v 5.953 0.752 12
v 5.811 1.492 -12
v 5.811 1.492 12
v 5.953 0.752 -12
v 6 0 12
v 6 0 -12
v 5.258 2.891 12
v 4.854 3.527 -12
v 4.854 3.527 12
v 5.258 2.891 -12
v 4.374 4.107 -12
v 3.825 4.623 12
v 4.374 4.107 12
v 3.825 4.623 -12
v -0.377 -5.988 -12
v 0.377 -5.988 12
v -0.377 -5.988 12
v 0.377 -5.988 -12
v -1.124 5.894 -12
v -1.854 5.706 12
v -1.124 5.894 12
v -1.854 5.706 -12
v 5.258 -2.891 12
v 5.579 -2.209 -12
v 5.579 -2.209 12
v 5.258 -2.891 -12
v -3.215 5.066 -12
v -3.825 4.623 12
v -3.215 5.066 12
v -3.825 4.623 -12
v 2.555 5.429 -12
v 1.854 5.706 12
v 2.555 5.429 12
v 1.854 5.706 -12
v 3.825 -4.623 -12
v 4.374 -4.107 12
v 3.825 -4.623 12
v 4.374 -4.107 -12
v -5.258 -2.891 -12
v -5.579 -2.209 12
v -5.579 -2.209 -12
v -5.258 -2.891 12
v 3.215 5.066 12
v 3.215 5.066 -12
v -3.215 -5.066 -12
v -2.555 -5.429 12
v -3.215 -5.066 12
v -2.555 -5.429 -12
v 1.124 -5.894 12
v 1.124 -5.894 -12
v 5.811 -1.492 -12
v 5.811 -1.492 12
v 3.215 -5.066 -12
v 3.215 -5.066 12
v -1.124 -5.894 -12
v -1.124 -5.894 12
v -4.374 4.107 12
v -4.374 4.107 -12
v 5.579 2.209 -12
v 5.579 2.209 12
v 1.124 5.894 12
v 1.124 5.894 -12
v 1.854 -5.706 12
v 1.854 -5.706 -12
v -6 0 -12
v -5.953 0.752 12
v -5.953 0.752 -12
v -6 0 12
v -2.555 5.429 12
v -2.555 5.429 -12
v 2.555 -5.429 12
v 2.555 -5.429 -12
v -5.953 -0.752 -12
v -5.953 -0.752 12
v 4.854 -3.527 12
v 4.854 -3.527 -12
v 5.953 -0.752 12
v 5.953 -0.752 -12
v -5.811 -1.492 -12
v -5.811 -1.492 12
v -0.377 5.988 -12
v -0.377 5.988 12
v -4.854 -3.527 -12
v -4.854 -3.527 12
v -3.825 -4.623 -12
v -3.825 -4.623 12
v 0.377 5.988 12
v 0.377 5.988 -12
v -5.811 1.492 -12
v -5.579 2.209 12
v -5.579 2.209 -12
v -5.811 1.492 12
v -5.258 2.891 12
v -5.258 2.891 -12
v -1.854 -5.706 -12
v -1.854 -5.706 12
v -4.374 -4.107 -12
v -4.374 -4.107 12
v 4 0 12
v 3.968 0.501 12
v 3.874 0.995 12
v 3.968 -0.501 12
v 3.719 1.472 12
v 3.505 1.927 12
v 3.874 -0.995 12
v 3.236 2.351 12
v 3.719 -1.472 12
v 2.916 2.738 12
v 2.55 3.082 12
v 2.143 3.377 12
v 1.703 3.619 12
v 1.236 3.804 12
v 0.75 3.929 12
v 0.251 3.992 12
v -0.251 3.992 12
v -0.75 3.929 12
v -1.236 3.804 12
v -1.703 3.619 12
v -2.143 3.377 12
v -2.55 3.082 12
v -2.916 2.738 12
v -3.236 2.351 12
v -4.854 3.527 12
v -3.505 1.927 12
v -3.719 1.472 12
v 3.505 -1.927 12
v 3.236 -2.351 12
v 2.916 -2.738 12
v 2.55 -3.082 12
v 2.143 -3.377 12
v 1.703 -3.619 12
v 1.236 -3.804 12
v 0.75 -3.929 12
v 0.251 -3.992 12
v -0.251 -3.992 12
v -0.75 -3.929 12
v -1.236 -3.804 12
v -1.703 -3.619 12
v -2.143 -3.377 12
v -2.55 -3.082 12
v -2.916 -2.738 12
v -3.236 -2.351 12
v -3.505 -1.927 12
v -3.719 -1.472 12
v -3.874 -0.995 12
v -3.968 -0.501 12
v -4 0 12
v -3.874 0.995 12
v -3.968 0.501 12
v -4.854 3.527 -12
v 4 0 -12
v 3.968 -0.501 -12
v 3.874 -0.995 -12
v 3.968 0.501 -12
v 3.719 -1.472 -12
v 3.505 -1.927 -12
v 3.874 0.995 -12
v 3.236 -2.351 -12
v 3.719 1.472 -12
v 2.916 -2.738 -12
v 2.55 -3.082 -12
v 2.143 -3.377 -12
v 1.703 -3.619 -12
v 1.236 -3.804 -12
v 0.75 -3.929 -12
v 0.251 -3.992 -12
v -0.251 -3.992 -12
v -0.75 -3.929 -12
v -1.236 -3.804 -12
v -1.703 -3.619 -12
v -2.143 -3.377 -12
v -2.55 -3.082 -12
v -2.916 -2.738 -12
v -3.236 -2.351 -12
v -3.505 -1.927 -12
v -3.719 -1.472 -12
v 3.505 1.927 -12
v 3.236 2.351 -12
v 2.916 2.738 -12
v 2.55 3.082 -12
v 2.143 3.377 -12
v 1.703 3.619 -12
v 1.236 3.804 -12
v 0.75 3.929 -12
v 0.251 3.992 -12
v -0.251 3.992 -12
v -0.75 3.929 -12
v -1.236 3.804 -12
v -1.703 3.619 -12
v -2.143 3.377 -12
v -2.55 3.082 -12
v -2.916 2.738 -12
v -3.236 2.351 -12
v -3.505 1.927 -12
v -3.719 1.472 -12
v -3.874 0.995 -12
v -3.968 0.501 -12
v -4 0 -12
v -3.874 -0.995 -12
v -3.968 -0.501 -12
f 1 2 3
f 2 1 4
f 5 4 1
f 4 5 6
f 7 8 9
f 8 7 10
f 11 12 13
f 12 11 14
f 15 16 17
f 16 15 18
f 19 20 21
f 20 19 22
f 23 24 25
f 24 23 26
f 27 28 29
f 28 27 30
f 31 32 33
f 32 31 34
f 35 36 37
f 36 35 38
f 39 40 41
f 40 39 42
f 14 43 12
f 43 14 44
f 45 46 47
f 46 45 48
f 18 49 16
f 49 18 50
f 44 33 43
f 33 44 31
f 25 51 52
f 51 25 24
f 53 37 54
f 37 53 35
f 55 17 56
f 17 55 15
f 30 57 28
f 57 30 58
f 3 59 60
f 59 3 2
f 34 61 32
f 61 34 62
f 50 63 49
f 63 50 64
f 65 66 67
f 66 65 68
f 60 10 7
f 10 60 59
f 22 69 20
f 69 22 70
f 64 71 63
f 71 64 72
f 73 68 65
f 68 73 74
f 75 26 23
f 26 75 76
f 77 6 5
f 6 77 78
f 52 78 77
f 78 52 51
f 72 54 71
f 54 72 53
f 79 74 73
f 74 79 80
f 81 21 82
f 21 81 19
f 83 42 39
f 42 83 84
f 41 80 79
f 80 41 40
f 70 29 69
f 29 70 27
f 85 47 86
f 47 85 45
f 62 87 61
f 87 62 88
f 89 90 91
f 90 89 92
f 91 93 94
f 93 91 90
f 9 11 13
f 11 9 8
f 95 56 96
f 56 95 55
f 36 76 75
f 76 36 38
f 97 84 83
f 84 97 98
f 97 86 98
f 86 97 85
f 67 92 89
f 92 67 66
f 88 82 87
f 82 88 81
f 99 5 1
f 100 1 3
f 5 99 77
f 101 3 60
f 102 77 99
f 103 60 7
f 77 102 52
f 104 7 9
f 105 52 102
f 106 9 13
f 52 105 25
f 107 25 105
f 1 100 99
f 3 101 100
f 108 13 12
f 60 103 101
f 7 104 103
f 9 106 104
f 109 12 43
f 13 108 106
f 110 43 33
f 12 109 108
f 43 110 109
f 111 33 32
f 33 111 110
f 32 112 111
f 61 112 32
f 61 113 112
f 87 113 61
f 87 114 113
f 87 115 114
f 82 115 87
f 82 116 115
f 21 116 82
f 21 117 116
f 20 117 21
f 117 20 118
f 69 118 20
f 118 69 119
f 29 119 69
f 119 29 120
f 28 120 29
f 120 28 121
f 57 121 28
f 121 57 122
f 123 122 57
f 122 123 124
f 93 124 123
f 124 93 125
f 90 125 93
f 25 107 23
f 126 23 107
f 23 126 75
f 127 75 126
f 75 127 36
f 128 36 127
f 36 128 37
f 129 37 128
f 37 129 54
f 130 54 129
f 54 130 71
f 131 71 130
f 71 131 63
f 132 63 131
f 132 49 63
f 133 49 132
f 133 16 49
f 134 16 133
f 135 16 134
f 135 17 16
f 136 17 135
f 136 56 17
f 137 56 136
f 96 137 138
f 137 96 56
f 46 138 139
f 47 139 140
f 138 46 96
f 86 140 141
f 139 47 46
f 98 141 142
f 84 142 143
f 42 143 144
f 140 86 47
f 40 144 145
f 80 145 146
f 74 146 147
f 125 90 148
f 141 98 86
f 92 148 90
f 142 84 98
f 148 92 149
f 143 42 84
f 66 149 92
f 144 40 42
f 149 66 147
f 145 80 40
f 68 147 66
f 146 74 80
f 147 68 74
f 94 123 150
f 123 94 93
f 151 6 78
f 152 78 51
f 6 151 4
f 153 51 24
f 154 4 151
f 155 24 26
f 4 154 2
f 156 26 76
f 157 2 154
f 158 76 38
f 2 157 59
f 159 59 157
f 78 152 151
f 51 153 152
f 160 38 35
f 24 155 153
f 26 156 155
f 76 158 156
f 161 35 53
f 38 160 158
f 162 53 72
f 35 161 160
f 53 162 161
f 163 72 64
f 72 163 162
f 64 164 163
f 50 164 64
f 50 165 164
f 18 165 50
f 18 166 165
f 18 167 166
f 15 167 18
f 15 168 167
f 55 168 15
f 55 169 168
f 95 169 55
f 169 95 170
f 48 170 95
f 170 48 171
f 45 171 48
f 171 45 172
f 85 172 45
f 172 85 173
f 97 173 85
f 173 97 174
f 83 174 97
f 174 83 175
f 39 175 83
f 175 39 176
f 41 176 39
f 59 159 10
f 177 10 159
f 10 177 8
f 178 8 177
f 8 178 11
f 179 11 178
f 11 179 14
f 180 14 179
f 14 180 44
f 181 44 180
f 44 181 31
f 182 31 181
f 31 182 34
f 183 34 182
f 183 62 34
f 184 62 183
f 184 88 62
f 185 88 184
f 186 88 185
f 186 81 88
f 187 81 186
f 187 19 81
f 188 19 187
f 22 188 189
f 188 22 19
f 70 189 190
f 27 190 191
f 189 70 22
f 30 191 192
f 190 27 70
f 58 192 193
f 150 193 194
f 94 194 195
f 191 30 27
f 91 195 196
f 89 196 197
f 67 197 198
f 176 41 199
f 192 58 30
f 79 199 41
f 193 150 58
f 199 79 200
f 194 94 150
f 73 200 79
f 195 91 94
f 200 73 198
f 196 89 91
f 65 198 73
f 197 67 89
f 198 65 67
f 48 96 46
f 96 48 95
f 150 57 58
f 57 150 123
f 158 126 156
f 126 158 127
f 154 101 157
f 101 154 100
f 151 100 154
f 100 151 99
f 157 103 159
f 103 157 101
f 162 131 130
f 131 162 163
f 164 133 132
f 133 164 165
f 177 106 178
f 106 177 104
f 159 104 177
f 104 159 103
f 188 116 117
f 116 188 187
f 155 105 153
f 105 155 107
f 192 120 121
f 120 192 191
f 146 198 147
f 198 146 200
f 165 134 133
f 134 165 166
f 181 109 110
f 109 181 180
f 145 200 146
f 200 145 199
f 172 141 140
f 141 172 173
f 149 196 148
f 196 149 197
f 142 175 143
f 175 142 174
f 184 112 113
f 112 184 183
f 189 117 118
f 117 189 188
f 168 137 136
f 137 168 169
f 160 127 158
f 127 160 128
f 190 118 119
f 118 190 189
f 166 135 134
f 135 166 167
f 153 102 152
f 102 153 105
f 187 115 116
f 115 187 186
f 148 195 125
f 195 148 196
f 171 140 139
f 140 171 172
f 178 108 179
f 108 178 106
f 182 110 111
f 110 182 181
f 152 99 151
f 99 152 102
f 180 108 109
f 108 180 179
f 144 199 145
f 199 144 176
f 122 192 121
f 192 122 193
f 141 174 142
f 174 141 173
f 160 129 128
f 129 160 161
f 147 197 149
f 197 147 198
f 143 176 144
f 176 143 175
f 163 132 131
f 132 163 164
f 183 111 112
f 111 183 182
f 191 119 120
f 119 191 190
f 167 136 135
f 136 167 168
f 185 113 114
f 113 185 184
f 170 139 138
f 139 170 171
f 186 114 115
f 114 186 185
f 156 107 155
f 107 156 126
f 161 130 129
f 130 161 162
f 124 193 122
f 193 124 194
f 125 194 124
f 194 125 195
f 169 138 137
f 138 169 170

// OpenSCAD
$fn = 50;


difference() {
	union() {
		translate(v = [0, 0, -12.0000000000]) {
			cylinder(h = 24, r = 6.0000000000);
		}
	}
	union() {
		translate(v = [0, 0, -100.0000000000]) {
			cylinder(h = 200, r = 4.0000000000);
		}
	}
}
